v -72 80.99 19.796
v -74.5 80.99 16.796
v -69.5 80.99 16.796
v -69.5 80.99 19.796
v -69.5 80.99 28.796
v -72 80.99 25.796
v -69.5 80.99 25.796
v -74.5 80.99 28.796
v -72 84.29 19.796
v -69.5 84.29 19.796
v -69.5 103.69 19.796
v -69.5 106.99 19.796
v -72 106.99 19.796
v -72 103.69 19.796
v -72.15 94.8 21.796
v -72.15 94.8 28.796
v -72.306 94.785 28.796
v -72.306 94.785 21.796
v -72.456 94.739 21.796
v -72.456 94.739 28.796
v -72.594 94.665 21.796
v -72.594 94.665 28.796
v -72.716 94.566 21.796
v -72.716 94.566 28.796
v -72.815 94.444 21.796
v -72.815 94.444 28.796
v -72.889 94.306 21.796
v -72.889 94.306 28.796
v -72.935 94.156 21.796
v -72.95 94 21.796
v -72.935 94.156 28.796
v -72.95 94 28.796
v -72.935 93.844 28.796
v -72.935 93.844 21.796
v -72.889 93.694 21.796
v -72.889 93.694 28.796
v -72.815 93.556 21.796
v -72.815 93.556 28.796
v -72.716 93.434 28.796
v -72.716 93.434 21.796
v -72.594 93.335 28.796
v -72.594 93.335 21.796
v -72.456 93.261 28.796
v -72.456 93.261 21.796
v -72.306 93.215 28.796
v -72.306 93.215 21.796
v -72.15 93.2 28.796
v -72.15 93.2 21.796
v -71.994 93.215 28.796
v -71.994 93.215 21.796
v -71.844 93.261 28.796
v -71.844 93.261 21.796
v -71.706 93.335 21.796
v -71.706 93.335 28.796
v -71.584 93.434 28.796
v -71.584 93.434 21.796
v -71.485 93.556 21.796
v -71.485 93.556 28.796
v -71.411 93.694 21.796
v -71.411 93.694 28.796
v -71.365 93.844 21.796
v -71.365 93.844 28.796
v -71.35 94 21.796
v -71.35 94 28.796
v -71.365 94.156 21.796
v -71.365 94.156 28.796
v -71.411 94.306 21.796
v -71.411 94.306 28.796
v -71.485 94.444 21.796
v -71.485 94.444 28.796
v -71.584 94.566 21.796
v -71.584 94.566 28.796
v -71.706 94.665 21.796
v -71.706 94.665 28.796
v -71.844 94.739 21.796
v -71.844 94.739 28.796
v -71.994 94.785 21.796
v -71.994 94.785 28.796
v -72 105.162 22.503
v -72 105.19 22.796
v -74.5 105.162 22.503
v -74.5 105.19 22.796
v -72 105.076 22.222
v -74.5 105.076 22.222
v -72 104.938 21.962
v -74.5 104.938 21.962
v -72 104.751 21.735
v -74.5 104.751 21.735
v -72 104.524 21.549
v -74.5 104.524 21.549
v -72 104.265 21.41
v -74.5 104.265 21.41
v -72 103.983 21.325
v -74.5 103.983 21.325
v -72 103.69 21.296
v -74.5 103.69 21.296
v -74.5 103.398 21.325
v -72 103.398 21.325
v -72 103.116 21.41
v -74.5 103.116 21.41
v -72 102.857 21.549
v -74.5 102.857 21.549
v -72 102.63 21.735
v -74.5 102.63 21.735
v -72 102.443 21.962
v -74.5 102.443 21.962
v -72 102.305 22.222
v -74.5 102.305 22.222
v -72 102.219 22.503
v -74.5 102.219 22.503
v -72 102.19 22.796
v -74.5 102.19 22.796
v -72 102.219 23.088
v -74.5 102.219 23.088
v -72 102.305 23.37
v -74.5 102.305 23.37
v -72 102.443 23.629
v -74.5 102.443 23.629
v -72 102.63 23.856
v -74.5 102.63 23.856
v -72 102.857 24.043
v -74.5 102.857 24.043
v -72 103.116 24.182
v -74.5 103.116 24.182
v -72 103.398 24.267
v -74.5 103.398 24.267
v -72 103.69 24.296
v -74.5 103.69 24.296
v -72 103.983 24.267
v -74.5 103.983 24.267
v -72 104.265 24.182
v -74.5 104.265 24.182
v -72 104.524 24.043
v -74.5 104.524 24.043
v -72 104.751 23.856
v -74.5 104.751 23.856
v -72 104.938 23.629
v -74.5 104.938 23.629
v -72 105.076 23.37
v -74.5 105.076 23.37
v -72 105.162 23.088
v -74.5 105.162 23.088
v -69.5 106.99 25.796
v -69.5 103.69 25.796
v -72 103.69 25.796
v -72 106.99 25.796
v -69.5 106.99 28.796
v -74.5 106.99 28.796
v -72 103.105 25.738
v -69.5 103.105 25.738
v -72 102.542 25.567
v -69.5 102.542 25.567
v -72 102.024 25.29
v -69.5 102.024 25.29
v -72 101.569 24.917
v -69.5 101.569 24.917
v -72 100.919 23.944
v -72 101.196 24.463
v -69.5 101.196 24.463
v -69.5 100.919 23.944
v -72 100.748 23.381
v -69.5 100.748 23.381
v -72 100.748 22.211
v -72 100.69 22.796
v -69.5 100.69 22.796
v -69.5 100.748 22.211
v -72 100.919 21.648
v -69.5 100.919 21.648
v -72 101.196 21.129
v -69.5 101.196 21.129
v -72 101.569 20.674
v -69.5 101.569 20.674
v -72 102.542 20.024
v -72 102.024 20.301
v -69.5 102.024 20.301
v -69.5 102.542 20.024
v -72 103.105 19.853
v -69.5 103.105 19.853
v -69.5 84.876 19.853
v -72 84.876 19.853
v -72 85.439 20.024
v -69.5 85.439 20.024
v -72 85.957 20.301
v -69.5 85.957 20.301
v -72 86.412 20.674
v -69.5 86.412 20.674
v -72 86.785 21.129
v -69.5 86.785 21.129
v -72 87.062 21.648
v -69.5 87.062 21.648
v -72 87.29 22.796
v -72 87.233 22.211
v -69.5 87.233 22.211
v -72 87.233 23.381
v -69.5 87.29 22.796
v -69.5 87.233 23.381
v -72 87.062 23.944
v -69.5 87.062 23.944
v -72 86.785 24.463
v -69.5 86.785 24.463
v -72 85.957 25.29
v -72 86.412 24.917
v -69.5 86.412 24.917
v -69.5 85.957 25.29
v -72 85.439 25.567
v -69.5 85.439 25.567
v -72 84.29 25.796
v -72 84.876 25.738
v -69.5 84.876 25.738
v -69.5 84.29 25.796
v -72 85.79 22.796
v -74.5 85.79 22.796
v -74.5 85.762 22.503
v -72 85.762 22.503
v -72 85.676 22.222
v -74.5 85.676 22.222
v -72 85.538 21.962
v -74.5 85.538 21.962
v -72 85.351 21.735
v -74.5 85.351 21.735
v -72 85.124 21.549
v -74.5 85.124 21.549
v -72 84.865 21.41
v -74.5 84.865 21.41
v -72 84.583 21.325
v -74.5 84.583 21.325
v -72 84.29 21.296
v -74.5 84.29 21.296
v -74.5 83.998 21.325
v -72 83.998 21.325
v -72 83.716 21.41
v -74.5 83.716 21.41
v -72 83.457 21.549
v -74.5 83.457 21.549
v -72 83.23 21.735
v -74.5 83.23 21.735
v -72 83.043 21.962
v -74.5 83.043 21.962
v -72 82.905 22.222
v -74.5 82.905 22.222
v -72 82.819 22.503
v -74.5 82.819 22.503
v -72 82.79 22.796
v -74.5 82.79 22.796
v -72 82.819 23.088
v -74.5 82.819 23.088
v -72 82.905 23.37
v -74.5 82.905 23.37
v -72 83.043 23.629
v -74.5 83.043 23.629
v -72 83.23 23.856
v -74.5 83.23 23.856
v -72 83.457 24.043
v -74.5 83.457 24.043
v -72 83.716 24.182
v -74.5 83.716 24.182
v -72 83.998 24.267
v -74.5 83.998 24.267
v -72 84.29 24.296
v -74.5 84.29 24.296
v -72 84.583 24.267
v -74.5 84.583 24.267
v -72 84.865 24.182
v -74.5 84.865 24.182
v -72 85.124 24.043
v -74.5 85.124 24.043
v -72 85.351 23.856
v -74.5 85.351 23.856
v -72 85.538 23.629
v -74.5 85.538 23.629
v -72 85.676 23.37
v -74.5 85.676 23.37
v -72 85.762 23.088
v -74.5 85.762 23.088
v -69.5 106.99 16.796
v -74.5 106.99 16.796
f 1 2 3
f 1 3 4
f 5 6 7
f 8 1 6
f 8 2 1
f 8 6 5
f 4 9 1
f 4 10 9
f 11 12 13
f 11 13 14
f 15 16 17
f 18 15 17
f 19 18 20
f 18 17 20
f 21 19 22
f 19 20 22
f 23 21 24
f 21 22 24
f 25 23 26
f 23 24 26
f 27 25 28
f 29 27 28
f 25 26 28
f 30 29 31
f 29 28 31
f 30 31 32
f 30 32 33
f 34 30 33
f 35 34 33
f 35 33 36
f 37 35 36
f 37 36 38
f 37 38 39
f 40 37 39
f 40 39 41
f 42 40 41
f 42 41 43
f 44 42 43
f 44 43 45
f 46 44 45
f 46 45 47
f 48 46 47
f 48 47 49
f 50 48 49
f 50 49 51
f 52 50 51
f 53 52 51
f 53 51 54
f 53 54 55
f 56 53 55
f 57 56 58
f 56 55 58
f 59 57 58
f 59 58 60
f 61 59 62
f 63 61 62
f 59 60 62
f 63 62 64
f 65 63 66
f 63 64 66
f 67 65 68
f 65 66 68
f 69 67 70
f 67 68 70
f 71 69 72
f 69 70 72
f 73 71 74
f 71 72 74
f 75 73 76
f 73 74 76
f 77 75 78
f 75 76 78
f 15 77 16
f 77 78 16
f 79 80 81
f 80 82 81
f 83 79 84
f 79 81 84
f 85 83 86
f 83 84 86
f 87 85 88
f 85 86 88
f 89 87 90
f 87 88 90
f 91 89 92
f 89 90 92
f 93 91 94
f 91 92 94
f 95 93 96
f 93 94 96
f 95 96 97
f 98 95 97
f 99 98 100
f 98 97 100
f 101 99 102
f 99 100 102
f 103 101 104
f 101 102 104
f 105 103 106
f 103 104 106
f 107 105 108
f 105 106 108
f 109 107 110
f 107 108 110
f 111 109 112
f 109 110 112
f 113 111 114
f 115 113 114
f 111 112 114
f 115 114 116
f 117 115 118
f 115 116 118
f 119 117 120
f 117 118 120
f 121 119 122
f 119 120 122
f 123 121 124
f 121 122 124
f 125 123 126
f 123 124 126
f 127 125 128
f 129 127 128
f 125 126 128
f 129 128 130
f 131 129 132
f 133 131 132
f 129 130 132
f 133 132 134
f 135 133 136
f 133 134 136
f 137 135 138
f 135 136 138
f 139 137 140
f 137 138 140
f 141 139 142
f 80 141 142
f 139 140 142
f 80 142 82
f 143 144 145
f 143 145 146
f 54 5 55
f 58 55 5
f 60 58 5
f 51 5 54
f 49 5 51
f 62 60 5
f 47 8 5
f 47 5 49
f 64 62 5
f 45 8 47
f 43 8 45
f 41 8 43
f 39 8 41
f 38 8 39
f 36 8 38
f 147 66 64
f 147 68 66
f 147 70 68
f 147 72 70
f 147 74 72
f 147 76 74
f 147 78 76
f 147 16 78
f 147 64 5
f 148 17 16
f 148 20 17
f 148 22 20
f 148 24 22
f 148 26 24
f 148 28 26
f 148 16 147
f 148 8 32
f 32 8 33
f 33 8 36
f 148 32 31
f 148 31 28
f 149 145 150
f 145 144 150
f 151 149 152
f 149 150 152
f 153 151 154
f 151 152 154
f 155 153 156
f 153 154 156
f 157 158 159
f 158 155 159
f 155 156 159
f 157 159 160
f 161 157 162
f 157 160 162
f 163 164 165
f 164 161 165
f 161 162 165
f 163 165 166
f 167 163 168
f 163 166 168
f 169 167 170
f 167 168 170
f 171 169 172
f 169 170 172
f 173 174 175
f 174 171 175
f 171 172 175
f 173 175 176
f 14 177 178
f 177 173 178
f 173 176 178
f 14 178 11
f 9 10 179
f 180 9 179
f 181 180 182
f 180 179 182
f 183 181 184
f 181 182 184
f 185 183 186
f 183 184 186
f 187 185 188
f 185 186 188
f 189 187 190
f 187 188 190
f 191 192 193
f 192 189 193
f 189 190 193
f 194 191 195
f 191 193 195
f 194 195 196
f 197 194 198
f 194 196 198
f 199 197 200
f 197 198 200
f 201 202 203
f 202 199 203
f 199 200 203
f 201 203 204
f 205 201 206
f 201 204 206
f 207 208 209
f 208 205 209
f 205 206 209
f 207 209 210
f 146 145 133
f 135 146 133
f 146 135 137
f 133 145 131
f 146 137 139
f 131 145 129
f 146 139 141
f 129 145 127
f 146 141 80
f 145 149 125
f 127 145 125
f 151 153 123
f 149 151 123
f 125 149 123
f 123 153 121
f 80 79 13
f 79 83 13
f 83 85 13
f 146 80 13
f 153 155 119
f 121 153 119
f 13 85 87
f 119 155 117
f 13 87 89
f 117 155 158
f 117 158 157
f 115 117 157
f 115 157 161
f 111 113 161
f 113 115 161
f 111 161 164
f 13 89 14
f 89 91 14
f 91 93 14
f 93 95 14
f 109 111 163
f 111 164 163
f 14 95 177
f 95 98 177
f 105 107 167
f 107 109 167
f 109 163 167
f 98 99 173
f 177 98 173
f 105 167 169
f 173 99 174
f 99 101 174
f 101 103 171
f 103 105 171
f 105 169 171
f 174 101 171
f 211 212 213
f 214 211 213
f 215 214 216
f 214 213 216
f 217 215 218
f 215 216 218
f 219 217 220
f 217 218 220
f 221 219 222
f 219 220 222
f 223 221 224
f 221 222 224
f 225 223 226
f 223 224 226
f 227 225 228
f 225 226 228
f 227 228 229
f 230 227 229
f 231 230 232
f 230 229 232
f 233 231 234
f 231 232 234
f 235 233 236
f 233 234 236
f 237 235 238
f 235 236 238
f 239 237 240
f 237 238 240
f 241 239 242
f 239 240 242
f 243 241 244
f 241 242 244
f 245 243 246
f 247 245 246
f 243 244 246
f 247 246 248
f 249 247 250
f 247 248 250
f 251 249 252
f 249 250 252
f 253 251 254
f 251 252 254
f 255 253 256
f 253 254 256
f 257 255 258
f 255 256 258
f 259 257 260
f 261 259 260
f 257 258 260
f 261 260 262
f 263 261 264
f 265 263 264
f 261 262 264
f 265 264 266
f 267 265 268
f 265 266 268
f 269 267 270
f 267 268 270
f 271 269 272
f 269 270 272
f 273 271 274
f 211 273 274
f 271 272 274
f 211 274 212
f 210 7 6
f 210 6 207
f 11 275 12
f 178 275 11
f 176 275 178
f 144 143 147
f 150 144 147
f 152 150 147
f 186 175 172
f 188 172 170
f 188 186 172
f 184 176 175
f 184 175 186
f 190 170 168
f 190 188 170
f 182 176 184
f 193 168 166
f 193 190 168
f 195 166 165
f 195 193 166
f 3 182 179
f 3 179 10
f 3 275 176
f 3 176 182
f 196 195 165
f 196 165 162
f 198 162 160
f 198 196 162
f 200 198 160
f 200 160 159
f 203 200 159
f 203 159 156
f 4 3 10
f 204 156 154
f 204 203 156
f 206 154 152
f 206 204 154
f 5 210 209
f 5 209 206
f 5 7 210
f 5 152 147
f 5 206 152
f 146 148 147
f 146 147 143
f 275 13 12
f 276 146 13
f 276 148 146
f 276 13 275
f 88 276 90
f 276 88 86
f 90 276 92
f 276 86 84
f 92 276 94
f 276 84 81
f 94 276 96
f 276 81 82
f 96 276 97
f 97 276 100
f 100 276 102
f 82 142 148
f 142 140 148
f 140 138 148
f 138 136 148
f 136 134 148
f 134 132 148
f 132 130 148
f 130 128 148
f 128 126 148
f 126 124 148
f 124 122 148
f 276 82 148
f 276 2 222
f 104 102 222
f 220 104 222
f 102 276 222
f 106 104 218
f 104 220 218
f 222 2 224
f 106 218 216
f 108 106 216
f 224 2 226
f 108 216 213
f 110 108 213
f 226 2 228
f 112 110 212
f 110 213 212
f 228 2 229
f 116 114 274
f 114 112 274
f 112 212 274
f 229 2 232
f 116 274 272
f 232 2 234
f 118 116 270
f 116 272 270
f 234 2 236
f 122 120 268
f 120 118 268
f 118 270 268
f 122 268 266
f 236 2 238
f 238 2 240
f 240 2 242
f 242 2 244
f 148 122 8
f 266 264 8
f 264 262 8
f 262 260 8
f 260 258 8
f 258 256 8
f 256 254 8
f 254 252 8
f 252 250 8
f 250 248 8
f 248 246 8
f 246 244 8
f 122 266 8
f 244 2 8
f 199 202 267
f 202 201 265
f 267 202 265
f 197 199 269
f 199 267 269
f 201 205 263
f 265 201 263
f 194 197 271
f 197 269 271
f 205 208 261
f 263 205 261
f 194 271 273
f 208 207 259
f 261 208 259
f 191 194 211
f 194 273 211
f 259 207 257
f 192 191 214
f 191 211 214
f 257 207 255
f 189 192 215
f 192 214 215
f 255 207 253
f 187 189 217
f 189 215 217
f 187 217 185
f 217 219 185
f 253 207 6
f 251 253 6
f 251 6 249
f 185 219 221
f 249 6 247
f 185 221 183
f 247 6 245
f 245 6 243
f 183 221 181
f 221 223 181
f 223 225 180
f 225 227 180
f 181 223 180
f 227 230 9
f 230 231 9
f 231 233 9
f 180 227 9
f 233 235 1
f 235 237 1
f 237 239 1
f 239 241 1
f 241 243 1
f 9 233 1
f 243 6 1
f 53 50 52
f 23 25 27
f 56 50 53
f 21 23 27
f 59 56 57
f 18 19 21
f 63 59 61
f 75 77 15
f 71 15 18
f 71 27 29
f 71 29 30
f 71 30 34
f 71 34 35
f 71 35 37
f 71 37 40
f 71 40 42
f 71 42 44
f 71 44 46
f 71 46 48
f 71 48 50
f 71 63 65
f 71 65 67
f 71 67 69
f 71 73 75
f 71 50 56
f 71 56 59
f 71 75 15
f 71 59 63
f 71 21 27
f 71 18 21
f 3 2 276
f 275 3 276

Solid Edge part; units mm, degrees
sketch "Sketch1" plane through (-74.5, 0, 0) normal (1, 0, 0) x (0, 1, 0)
  line L0 (80.9905, 16.7958) -> (106.9905, 16.7958)
  line L1 (106.9905, 28.7958) -> (106.9905, 16.7958)
  line L2 (80.9905, 28.7958) -> (106.9905, 28.7958)
  line L3 (80.9905, 16.7958) -> (80.9905, 28.7958)
  circle A0 centre (84.2905, 22.7958) radius 1.5
  circle A1 centre (103.6905, 22.7958) radius 1.5
extrude "Protrusion1" add sketch "Sketch1" along normal blind 5
sketch "Sketch2" plane through (-72, 93.9905, 28.7958) normal (0, 0, 1) x (0, 1, 0)
  circle A0 centre (0.0095, 0.15) radius 0.8
extrude "ExtrudedCutout_1" cut sketch "Sketch2" against normal blind 7
sketch "Sketch3" plane through (-69.5, 93.9905, 22.7958) normal (1, 0, 0) x (0, 1, 0)
  line L0 (-9.7, -3) -> (-13, -3)
  line L1 (-13, 3) -> (-13, -3)
  line L2 (-13, 3) -> (-9.7, 3)
  arc A0 (-9.7, 3) -> (-9.7, -3) centre (-9.7, 0) cw
  line L3 (9.7, 3) -> (13, 3)
  line L4 (13, 3) -> (13, -3)
  line L5 (13, -3) -> (9.7, -3)
  arc A1 (9.7, -3) -> (9.7, 3) centre (9.7, 0) cw
extrude "ExtrudedCutout_3" cut sketch "Sketch3" against normal blind 2.5
